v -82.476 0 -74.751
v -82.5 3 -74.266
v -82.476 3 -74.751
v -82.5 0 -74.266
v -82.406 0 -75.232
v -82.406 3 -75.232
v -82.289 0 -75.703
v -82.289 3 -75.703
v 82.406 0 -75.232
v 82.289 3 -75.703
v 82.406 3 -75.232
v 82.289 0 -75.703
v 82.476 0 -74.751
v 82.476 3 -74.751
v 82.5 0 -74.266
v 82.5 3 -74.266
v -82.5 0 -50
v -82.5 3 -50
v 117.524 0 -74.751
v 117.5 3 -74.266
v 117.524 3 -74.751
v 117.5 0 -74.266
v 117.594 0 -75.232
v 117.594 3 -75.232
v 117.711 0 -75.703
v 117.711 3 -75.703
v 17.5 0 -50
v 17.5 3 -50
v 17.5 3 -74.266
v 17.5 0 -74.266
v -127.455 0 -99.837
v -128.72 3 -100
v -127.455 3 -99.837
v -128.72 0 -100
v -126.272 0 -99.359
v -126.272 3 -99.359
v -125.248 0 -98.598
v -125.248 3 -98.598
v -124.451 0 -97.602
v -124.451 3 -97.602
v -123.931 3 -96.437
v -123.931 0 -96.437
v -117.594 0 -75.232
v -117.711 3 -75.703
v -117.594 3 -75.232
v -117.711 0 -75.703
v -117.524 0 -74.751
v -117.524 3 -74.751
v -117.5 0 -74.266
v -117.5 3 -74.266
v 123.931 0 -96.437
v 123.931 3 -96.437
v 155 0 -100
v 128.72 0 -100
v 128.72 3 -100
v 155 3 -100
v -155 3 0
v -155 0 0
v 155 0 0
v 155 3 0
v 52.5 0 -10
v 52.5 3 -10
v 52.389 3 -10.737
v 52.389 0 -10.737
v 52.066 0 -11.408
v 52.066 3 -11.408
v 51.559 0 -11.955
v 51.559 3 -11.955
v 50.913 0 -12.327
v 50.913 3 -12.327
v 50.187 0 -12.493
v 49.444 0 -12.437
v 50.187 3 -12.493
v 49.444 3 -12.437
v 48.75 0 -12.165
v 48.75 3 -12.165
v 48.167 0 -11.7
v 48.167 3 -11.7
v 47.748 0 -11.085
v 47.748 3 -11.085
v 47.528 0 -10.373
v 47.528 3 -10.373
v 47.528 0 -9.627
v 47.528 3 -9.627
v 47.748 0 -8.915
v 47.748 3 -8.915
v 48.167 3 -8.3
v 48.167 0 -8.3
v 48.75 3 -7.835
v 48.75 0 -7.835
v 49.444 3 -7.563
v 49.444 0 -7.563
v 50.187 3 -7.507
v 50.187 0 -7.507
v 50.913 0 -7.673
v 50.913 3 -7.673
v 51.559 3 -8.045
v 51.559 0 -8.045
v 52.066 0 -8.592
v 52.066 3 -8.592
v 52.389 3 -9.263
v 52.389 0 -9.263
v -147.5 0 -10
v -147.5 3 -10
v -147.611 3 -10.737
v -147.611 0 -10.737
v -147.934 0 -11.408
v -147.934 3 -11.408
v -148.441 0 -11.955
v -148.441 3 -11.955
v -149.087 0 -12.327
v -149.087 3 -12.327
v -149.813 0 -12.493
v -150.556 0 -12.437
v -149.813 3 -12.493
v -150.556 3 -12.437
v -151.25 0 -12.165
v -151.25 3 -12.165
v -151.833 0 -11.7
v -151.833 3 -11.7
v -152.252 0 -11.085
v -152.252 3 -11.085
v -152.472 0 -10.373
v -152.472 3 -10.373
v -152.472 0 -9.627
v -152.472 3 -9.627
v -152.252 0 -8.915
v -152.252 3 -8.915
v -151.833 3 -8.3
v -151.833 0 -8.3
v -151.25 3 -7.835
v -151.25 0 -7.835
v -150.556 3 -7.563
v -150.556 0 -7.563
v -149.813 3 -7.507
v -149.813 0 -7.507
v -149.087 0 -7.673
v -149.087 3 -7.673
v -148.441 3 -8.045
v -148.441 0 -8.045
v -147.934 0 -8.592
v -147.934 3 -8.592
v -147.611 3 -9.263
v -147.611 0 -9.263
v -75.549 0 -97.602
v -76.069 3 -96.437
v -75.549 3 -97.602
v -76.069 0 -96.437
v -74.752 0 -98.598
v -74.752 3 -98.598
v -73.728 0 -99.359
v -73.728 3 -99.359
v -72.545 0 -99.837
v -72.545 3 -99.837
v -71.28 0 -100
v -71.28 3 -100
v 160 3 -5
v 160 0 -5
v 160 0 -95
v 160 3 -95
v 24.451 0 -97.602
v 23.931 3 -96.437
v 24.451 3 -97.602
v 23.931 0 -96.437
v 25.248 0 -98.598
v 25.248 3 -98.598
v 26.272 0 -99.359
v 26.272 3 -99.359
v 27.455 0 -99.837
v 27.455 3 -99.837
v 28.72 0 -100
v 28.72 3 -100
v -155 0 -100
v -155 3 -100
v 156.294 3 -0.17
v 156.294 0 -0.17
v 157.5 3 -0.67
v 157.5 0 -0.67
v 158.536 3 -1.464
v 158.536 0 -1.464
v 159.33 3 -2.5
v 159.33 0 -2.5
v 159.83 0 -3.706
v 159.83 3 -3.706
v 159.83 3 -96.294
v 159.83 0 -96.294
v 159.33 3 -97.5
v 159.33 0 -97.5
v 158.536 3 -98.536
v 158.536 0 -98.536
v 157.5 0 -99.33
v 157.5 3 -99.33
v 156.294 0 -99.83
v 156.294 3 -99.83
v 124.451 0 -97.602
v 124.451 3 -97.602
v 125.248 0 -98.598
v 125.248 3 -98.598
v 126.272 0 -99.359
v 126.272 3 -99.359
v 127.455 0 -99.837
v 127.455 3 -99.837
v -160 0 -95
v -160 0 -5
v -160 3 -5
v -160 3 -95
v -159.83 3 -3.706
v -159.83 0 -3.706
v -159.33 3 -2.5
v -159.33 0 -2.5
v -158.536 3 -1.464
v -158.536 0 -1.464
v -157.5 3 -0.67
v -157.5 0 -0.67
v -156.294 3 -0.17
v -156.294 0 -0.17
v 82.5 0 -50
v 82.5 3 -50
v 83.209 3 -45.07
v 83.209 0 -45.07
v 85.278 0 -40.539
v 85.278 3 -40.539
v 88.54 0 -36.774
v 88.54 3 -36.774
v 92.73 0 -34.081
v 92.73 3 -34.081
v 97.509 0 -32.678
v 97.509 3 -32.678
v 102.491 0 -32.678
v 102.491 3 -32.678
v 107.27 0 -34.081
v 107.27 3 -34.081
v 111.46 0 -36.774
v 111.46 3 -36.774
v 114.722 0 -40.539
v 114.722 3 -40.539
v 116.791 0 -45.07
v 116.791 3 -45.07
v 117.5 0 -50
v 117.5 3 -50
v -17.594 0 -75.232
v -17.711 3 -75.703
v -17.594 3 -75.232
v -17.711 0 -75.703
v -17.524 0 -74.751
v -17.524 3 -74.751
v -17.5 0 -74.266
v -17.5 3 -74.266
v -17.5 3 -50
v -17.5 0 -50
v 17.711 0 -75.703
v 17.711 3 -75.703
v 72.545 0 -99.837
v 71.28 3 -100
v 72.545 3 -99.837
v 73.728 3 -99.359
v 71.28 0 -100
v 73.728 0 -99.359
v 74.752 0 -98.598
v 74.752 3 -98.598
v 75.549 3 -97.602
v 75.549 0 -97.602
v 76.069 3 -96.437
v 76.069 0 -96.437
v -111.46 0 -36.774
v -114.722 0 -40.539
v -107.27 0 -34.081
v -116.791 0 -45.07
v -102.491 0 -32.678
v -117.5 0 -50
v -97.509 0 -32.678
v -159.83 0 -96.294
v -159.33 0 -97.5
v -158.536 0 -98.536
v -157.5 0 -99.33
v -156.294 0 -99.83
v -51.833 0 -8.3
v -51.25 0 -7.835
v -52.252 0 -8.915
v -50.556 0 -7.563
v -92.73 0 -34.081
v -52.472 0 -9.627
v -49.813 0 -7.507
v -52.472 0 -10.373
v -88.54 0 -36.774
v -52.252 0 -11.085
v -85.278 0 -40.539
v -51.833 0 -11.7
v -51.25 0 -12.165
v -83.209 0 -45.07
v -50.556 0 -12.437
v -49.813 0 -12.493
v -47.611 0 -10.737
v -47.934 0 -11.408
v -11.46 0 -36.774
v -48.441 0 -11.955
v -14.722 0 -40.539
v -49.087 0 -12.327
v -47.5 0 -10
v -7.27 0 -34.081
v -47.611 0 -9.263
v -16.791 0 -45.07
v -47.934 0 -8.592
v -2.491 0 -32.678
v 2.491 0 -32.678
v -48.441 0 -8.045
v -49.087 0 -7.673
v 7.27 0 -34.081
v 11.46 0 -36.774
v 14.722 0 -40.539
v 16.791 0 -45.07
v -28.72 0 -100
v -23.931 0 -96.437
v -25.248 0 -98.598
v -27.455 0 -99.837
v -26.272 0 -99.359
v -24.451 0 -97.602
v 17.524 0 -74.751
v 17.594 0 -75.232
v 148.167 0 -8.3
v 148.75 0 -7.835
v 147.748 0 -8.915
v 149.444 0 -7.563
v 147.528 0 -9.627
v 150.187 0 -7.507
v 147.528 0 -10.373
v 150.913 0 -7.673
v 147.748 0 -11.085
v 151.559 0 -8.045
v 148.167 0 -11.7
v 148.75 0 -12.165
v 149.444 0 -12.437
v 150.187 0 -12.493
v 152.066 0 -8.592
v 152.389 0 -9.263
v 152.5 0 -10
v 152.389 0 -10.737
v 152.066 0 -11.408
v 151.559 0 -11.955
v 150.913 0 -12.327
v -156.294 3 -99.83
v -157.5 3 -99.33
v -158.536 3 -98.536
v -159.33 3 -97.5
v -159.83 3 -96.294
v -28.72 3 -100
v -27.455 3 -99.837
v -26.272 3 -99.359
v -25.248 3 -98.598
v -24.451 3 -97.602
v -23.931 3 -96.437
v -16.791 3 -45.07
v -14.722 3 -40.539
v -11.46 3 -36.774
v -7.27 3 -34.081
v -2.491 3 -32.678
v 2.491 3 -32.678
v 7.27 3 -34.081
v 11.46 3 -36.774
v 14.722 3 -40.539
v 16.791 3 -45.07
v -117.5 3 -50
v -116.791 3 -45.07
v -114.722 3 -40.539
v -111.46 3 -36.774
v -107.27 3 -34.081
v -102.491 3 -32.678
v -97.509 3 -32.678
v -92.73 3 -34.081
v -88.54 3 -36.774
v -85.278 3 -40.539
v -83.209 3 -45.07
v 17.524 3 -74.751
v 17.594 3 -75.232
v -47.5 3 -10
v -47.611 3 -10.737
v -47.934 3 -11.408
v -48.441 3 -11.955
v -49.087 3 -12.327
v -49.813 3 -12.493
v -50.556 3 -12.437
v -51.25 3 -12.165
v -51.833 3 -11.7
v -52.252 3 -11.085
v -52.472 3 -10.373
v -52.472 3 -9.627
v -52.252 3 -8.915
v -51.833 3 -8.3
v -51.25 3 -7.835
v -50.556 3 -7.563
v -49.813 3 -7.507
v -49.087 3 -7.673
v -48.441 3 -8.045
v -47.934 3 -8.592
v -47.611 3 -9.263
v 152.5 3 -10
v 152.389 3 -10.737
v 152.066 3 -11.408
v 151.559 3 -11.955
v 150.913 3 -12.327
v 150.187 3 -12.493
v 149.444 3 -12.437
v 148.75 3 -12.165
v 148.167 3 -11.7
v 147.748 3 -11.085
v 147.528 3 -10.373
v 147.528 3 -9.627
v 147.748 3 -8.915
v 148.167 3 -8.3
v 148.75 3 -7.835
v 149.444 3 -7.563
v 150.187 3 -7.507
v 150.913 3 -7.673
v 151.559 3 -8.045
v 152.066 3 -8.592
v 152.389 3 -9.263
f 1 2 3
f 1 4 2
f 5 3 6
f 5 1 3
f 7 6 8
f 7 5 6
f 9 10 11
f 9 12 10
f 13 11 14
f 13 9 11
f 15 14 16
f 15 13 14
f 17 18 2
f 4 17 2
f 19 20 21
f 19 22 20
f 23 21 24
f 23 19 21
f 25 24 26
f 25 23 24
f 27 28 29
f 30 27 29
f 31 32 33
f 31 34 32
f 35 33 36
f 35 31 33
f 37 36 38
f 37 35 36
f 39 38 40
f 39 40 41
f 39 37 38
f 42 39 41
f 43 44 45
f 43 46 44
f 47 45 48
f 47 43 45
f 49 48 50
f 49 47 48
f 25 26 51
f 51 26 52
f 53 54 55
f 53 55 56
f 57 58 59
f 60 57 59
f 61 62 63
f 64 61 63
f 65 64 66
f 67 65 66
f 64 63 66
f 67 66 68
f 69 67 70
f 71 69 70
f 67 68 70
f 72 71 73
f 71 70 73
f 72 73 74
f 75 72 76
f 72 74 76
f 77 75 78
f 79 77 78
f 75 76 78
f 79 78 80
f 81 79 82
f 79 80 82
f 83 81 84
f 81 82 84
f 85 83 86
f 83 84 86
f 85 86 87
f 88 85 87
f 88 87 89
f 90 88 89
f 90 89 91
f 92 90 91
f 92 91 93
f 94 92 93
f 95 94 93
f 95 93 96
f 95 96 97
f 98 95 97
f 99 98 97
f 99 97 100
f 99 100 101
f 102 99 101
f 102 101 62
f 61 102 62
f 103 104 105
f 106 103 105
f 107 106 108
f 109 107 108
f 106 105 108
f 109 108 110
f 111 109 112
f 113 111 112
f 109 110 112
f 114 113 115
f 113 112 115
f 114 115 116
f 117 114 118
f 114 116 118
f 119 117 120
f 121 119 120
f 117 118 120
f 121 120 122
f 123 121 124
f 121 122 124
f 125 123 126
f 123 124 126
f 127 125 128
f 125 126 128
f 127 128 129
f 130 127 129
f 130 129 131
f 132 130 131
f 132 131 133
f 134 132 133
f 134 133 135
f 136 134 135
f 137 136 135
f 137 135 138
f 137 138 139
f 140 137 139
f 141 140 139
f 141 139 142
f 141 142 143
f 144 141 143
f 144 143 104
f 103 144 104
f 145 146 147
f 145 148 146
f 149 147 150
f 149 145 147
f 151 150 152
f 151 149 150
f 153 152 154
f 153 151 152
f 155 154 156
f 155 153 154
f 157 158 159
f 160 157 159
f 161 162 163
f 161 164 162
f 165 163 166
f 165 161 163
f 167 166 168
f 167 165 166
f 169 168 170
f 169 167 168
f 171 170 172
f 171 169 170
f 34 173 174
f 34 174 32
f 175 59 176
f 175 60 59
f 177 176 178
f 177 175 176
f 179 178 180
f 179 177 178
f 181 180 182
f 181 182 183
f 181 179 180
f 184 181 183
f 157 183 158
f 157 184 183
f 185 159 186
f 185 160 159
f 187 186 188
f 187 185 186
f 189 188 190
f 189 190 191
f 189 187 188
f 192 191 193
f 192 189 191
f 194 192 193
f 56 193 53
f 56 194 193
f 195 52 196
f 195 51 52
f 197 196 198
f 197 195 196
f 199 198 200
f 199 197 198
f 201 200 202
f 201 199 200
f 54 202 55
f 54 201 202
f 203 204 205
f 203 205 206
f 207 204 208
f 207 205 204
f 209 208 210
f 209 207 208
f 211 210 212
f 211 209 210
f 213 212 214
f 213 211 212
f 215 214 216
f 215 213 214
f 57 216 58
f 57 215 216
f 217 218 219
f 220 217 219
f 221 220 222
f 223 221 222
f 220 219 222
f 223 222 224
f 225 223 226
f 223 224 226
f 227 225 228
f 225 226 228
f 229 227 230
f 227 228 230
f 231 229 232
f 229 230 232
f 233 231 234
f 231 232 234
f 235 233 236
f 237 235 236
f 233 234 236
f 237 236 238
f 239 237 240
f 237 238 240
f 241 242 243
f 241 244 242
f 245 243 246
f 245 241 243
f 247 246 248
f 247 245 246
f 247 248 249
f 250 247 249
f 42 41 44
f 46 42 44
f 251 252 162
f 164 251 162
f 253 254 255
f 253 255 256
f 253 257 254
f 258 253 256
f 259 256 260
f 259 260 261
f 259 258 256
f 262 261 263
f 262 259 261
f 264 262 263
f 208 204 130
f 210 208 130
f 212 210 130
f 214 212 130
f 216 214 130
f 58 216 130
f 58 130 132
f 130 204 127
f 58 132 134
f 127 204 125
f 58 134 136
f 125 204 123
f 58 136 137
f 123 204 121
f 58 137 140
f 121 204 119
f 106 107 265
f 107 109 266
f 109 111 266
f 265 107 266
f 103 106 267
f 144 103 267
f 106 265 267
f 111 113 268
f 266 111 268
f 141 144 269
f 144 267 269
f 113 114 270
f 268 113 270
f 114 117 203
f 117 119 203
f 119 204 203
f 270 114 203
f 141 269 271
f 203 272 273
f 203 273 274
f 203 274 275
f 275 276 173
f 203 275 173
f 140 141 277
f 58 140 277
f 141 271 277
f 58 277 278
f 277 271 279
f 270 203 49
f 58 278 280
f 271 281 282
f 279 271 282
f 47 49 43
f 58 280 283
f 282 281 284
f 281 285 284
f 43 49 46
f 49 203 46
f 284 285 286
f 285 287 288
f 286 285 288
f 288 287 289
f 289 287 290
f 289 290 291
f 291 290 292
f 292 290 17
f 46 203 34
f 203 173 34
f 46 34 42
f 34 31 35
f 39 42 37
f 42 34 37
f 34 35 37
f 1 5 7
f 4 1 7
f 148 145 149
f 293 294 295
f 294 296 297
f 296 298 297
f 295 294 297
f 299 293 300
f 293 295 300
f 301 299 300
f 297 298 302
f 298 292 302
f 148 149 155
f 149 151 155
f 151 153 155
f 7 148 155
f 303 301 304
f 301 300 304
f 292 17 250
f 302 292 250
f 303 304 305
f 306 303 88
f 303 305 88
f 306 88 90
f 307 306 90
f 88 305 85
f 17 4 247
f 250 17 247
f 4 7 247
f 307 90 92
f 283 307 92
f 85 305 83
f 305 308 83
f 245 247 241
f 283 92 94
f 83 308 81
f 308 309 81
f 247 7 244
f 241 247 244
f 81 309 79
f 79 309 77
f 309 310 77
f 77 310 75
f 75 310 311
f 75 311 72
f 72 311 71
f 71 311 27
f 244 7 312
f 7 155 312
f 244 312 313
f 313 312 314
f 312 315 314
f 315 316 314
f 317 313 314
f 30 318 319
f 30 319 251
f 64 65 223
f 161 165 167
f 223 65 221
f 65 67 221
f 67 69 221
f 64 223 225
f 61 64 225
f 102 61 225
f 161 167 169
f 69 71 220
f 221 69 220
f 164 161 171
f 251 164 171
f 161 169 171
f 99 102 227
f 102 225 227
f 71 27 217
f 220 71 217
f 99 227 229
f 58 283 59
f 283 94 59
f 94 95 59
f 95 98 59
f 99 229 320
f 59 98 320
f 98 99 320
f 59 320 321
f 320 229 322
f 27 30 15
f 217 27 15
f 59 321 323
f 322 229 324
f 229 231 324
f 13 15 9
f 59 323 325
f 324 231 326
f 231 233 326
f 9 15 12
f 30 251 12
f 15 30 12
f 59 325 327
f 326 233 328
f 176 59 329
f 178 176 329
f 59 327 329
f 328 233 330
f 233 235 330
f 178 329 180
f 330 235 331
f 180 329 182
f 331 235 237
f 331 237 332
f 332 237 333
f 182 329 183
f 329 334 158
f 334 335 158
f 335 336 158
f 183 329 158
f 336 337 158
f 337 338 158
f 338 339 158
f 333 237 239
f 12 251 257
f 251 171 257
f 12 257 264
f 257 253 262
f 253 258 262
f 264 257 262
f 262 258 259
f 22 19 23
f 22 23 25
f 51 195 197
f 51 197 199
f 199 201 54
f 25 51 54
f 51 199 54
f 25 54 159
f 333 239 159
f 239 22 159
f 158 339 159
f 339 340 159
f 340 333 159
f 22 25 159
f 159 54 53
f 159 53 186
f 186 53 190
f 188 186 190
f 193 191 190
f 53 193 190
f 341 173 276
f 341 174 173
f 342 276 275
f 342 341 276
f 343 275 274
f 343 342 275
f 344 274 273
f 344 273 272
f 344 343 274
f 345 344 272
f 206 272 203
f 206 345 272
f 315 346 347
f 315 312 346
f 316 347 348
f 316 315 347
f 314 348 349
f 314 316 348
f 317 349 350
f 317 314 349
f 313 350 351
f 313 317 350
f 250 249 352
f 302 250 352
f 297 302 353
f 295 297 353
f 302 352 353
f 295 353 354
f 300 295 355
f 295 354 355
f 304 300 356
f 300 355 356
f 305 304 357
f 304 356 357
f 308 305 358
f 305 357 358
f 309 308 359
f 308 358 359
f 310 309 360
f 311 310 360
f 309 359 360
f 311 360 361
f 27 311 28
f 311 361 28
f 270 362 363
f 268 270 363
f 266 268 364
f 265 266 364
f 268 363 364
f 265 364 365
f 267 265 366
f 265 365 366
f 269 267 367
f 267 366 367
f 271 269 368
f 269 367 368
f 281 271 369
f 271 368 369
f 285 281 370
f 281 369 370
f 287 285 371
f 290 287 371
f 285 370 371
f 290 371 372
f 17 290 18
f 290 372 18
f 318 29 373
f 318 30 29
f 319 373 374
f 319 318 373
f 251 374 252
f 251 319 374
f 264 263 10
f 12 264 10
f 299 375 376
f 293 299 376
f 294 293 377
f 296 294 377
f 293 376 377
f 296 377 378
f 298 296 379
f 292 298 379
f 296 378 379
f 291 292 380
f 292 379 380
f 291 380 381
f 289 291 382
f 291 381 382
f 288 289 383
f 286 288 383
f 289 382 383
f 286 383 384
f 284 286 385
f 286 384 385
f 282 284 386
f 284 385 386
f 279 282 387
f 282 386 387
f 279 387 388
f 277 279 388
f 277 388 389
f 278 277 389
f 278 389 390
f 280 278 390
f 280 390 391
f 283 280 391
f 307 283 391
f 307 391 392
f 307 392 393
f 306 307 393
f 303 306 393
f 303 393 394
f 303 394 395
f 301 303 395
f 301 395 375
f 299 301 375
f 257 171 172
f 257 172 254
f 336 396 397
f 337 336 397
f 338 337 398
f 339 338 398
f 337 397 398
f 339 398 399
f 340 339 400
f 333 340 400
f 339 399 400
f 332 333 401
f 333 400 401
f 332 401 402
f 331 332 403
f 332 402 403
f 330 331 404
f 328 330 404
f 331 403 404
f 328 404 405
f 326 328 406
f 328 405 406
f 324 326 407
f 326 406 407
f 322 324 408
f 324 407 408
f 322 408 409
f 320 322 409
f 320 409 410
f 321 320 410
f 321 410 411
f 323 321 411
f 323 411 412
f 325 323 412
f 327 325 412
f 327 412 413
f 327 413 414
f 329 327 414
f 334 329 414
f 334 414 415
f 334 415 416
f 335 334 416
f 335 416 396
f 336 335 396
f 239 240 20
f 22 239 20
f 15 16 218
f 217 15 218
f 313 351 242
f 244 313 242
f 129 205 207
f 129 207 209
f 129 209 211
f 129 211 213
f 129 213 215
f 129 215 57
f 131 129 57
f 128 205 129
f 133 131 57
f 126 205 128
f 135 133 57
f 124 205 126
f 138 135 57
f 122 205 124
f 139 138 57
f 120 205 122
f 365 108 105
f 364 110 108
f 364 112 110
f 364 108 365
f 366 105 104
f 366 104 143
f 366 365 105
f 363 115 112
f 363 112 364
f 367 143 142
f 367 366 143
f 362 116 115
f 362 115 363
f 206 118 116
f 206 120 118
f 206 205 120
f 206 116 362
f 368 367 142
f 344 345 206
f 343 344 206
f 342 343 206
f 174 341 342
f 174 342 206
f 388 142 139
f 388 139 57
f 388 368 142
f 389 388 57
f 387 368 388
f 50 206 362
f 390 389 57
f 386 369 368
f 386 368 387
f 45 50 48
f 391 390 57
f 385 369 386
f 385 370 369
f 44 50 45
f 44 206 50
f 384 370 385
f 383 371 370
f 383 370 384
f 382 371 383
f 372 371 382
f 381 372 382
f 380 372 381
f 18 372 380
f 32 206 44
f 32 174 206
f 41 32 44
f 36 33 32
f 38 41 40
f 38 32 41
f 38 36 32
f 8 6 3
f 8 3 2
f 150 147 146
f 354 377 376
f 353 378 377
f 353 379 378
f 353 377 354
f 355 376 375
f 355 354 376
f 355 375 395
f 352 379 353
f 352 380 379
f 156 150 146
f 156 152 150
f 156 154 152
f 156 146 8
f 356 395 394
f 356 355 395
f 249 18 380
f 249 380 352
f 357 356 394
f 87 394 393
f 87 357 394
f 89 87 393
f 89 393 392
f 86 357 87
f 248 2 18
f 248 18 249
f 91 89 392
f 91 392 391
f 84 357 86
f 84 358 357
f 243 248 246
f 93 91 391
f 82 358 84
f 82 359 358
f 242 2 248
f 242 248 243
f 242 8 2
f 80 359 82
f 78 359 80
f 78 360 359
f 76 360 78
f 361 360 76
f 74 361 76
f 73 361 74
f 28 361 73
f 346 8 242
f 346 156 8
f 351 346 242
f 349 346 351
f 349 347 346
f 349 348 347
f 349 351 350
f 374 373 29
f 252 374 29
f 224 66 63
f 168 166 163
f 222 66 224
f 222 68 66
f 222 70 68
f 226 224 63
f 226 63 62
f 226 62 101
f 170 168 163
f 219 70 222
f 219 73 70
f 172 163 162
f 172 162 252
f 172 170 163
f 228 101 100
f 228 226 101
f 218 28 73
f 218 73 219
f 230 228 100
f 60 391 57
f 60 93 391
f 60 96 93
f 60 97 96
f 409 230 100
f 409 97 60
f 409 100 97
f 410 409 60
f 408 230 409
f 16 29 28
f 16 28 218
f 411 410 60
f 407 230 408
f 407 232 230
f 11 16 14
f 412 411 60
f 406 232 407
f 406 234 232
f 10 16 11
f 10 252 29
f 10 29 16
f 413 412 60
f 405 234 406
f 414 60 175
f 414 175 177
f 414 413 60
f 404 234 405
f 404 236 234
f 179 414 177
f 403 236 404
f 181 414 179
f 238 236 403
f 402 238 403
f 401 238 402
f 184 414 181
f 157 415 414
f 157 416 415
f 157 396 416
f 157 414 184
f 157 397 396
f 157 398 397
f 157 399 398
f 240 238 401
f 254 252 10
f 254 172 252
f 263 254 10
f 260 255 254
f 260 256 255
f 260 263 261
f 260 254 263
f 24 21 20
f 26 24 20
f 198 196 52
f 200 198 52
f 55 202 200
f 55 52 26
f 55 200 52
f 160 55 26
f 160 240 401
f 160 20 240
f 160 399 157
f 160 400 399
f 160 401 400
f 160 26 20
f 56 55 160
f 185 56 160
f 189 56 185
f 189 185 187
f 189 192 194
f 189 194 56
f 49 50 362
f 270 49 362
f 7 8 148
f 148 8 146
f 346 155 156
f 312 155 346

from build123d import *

# Parameters (mm, degrees)
SKETCH1_W              = 320
SKETCH1_H              = 100
BOSS_EXTRUDE1_DEPTH    = 3
SKETCH2_R              = 2.5
CUT_EXTRUDE1_DEPTH     = 4
LPATTERN1_COUNT        = 4
LPATTERN1_PITCH        = 100
CUT_EXTRUDE2_DEPTH     = 4
FILLET1_R              = 5
LPATTERN2_COUNT        = 3
LPATTERN2_PITCH        = 100
FILLET1_OF_LPATTERN2_R = 5
FILLET2_R              = 5


with BuildPart() as part:
    # Sketch1 → Boss-Extrude1 (new body)
    with BuildSketch(Plane(origin=(0, 0, 0), x_dir=(1, 0, 0), z_dir=(0, 1, 0))):
        with Locations((0, 50)):
            Rectangle(SKETCH1_W, SKETCH1_H)
    extrude(amount=BOSS_EXTRUDE1_DEPTH)

    # Sketch2 → Cut-Extrude1 (cut, through all)
    with BuildSketch(Plane(origin=(0, 3, 0), x_dir=(1, 0, 0), z_dir=(0, 1, 0))):
        with Locations((-150, 10)):
            Circle(SKETCH2_R)
    cut_extrude1 = extrude(amount=-CUT_EXTRUDE1_DEPTH, mode=Mode.SUBTRACT)

    # LPattern1: Cut-Extrude1 ×4
    with Locations(*[(i * LPATTERN1_PITCH, 0, 0) for i in range(1, LPATTERN1_COUNT)]):
        add(cut_extrude1, mode=Mode.SUBTRACT)

    # Sketch3 → Cut-Extrude2 (cut, through all)
    with BuildSketch(Plane(origin=(0, 3, 0), x_dir=(1, 0, 0), z_dir=(0, 1, 0))):
        with BuildLine():
            Line((-125, 100), (-117.5, 75))
            Line((-117.5, 75), (-117.5, 50))
            ThreePointArc((-117.5, 50), (-100, 32.5), (-82.5, 50))
            Line((-82.5, 50), (-82.5, 75))
            Line((-82.5, 75), (-75, 100))
            Line((-75, 100), (-125, 100))
        make_face()
    cut_extrude2 = extrude(amount=-CUT_EXTRUDE2_DEPTH, mode=Mode.SUBTRACT)

    # Fillet1
    fillet1_edges = [part.edges().sort_by_distance(p)[0] for p in [
        (-125, 1.5, -100),
        (-75, 1.5, -100),
        (-82.5, 1.5, -75),
        (-117.5, 1.5, -75),
    ]]
    fillet(fillet1_edges, radius=FILLET1_R)

    # LPattern2: Cut-Extrude2 ×3
    with Locations(*[(i * LPATTERN2_PITCH, 0, 0) for i in range(1, LPATTERN2_COUNT)]):
        add(cut_extrude2, mode=Mode.SUBTRACT)

    # Fillet1 of LPattern2
    fillet1_of_lpattern2_edges = [part.edges().sort_by_distance(p)[0] for p in [
        (-25, 1.5, -100),
        (25, 1.5, -100),
        (17.5, 1.5, -75),
        (-17.5, 1.5, -75),
        (75, 1.5, -100),
        (125, 1.5, -100),
        (117.5, 1.5, -75),
        (82.5, 1.5, -75),
    ]]
    fillet(fillet1_of_lpattern2_edges, radius=FILLET1_OF_LPATTERN2_R)

    # Fillet2
    fillet2_edges = [part.edges().sort_by_distance(p)[0] for p in [
        (-160, 1.5, -100),
        (160, 1.5, -100),
        (160, 1.5, 0),
        (-160, 1.5, 0),
    ]]
    fillet(fillet2_edges, radius=FILLET2_R)


solid = part.part
